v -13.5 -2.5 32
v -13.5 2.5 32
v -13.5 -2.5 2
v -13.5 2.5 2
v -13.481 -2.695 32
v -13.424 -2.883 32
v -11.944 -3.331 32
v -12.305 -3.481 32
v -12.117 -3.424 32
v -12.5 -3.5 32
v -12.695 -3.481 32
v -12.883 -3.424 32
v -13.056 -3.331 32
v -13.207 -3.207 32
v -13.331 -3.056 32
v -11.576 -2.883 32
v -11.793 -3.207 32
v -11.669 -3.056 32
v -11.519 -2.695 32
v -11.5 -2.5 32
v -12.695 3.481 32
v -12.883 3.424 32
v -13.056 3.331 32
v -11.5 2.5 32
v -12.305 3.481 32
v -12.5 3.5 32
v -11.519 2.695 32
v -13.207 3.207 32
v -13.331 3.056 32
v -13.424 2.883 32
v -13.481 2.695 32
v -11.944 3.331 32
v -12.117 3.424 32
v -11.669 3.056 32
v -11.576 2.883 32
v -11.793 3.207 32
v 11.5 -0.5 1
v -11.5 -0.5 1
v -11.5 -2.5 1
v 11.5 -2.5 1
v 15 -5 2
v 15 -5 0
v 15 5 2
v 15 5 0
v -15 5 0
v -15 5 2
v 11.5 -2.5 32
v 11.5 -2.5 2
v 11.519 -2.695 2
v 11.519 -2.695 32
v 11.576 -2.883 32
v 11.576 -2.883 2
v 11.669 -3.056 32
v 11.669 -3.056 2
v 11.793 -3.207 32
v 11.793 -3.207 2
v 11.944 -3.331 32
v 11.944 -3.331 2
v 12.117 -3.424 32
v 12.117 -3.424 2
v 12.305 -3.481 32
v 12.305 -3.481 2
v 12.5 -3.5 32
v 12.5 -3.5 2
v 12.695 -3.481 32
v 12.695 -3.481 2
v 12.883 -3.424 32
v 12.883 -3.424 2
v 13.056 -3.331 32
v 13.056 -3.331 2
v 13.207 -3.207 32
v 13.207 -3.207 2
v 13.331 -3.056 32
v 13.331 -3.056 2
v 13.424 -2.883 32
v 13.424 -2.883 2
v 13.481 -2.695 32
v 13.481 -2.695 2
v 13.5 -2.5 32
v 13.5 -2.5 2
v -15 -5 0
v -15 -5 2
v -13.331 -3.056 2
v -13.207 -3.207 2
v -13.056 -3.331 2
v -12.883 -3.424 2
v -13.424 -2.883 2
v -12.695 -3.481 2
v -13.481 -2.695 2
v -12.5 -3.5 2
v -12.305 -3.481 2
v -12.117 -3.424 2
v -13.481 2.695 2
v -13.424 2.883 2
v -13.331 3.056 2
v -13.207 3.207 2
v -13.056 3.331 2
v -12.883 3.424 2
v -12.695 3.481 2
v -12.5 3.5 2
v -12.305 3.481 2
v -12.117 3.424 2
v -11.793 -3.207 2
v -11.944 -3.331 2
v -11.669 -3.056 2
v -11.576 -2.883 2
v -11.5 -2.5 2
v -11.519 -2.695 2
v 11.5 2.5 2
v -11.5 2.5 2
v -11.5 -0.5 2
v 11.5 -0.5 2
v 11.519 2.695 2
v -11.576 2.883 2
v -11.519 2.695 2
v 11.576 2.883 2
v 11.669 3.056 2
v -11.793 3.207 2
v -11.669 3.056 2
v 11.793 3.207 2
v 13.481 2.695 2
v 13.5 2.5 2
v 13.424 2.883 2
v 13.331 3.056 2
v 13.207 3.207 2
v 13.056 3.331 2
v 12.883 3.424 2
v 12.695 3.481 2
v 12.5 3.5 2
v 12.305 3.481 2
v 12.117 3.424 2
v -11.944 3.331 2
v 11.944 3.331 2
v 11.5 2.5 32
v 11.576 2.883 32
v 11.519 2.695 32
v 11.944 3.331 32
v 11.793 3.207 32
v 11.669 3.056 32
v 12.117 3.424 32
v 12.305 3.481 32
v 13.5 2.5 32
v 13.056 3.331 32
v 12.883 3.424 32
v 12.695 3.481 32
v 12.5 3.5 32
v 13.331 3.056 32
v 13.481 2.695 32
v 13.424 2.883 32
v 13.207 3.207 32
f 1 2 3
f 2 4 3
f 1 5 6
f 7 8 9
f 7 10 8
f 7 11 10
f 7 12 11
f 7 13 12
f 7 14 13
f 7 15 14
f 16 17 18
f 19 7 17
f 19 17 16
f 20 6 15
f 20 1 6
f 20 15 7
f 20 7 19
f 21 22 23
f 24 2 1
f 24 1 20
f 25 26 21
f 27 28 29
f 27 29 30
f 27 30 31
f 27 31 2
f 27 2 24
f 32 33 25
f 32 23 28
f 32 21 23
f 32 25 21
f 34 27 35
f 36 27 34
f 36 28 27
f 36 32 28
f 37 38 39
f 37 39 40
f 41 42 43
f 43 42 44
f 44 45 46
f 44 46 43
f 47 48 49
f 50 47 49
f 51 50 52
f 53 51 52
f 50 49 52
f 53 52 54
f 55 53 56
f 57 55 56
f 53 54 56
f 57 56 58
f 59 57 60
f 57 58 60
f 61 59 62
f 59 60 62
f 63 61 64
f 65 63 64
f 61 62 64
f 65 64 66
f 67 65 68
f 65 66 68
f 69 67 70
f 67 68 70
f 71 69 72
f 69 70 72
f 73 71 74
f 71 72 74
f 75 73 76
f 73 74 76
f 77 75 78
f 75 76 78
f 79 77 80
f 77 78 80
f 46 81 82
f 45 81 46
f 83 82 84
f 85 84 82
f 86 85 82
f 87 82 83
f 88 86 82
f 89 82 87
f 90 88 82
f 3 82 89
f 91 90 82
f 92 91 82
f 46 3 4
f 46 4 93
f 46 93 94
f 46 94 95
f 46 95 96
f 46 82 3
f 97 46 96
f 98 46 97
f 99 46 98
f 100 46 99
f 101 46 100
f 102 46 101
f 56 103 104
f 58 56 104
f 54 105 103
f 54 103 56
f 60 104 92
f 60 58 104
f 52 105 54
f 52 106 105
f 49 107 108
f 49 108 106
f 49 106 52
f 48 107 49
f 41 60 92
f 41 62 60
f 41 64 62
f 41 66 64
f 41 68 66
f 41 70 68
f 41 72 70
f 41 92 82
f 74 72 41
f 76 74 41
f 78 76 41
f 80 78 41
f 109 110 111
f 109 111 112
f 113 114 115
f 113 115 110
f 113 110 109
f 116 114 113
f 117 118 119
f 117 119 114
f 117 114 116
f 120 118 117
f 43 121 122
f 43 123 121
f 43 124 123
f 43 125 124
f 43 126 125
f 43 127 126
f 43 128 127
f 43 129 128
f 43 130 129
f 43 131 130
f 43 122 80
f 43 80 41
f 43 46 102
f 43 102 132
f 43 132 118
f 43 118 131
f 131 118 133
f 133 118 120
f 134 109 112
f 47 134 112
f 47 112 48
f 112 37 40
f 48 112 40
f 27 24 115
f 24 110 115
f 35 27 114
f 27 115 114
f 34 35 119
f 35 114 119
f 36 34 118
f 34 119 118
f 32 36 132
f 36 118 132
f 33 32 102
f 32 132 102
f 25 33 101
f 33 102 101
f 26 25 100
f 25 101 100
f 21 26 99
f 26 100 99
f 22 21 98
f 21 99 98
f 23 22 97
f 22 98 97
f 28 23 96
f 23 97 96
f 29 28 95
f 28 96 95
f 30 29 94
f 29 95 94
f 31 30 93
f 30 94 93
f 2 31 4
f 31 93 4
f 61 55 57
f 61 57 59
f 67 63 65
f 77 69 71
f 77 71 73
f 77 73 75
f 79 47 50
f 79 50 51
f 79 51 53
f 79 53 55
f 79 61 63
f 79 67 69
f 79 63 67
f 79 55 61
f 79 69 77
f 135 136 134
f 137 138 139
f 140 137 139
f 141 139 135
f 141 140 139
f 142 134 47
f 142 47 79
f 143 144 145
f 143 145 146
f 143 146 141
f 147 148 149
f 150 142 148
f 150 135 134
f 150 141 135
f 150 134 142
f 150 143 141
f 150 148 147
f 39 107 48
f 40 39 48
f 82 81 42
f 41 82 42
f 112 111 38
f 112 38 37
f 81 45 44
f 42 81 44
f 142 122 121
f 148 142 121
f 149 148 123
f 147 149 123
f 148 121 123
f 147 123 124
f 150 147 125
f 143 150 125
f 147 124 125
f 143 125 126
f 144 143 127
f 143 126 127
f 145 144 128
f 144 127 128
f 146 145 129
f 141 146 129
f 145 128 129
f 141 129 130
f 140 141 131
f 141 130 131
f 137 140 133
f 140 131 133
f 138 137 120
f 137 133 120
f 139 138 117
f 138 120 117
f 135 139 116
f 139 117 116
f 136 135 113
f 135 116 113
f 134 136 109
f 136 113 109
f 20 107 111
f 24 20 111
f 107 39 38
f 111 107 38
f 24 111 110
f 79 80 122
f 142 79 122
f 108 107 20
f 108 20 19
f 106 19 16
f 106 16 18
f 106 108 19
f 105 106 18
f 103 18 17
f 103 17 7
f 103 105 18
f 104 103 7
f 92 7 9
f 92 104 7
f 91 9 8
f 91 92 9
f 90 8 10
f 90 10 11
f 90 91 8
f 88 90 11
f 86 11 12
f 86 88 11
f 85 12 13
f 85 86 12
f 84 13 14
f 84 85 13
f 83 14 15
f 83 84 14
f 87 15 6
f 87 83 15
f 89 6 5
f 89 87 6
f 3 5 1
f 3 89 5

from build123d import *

# Parameters (mm, degrees)
CROQUIS1_W              = 30
CROQUIS1_H              = 10
SALIENTE_EXTRUIR1_DEPTH = 2
SALIENTE_EXTRUIR2_DEPTH = 20
CROQUIS3_W              = 23
CROQUIS3_H              = 2
CORTAR_EXTRUIR1_DEPTH   = 1
SALIENTE_EXTRUIR3_DEPTH = 10


with BuildPart() as part:
    # Croquis1 → Saliente-Extruir1 (new body)
    with BuildSketch(Plane.XY):
        Rectangle(CROQUIS1_W, CROQUIS1_H)
    extrude(amount=SALIENTE_EXTRUIR1_DEPTH)

    # Croquis2 → Saliente-Extruir2 (add)
    with BuildSketch(Plane.XY.offset(2)):
        with BuildLine():
            Line((-13.5, -2.5), (-13.5, 2.5))
            ThreePointArc((-13.5, 2.5), (-12.5, 3.5), (-11.5, 2.5))
            Line((-11.5, 2.5), (-11.5, -2.5))
            ThreePointArc((-11.5, -2.5), (-12.5, -3.5), (-13.5, -2.5))
        make_face()
        with BuildLine():
            Line((11.5, 2.5), (11.5, -2.5))
            ThreePointArc((11.5, -2.5), (12.5, -3.5), (13.5, -2.5))
            Line((13.5, -2.5), (13.5, 2.5))
            ThreePointArc((13.5, 2.5), (12.5, 3.5), (11.5, 2.5))
        make_face()
    extrude(amount=SALIENTE_EXTRUIR2_DEPTH)

    # Croquis3 → Cortar-Extruir1 (cut)
    with BuildSketch(Plane.XY.offset(2)):
        with Locations((0, -1.5)):
            Rectangle(CROQUIS3_W, CROQUIS3_H)
    extrude(amount=-CORTAR_EXTRUIR1_DEPTH, mode=Mode.SUBTRACT)

    # Croquis4 → Saliente-Extruir3 (add)
    with BuildSketch(Plane.XY.offset(22)):
        with BuildLine():
            Line((-13.5, 2.5), (-11.5, 2.5))
            ThreePointArc((-11.5, 2.5), (-12.5, 3.5), (-13.5, 2.5))
        make_face()
        with BuildLine():
            ThreePointArc((-11.5, 2.5), (-12.5, 3.5), (-13.5, 2.5))
            Line((-13.5, 2.5), (-11.5, 2.5))
        make_face()
        with BuildLine():
            Line((-11.5, 2.5), (-13.5, 2.5))
            ThreePointArc((-13.5, 2.5), (-12.5, 1.5), (-11.5, 2.5))
        make_face()
        with BuildLine():
            ThreePointArc((-11.5, 2.5), (-12.5, 1.5), (-13.5, 2.5))
            Line((-13.5, 2.5), (-13.5, -2.5))
            ThreePointArc((-13.5, -2.5), (-12.5, -1.5), (-11.5, -2.5))
            Line((-11.5, -2.5), (-11.5, 2.5))
        make_face()
        with BuildLine():
            Line((-13.5, -2.5), (-11.5, -2.5))
            ThreePointArc((-11.5, -2.5), (-12.5, -3.5), (-13.5, -2.5))
        make_face()
        with BuildLine():
            ThreePointArc((-11.5, -2.5), (-12.5, -1.5), (-13.5, -2.5))
            Line((-13.5, -2.5), (-11.5, -2.5))
        make_face()
        with BuildLine():
            Line((-11.5, -2.5), (-13.5, -2.5))
            ThreePointArc((-13.5, -2.5), (-12.5, -3.5), (-11.5, -2.5))
        make_face()
        with BuildLine():
            ThreePointArc((13.5, -2.5), (12.5, -1.5), (11.5, -2.5))
            Line((11.5, -2.5), (13.5, -2.5))
        make_face()
        with BuildLine():
            Line((13.5, -2.5), (11.5, -2.5))
            ThreePointArc((11.5, -2.5), (12.5, -3.5), (13.5, -2.5))
        make_face()
        with BuildLine():
            ThreePointArc((13.5, 2.5), (12.5, 1.5), (11.5, 2.5))
            Line((11.5, 2.5), (11.5, -2.5))
            ThreePointArc((11.5, -2.5), (12.5, -1.5), (13.5, -2.5))
            Line((13.5, -2.5), (13.5, 2.5))
        make_face()
        with BuildLine():
            ThreePointArc((13.5, 2.5), (12.5, 3.5), (11.5, 2.5))
            Line((11.5, 2.5), (13.5, 2.5))
        make_face()
        with BuildLine():
            Line((13.5, 2.5), (11.5, 2.5))
            ThreePointArc((11.5, 2.5), (12.5, 1.5), (13.5, 2.5))
        make_face()
    extrude(amount=SALIENTE_EXTRUIR3_DEPTH)


solid = part.part
